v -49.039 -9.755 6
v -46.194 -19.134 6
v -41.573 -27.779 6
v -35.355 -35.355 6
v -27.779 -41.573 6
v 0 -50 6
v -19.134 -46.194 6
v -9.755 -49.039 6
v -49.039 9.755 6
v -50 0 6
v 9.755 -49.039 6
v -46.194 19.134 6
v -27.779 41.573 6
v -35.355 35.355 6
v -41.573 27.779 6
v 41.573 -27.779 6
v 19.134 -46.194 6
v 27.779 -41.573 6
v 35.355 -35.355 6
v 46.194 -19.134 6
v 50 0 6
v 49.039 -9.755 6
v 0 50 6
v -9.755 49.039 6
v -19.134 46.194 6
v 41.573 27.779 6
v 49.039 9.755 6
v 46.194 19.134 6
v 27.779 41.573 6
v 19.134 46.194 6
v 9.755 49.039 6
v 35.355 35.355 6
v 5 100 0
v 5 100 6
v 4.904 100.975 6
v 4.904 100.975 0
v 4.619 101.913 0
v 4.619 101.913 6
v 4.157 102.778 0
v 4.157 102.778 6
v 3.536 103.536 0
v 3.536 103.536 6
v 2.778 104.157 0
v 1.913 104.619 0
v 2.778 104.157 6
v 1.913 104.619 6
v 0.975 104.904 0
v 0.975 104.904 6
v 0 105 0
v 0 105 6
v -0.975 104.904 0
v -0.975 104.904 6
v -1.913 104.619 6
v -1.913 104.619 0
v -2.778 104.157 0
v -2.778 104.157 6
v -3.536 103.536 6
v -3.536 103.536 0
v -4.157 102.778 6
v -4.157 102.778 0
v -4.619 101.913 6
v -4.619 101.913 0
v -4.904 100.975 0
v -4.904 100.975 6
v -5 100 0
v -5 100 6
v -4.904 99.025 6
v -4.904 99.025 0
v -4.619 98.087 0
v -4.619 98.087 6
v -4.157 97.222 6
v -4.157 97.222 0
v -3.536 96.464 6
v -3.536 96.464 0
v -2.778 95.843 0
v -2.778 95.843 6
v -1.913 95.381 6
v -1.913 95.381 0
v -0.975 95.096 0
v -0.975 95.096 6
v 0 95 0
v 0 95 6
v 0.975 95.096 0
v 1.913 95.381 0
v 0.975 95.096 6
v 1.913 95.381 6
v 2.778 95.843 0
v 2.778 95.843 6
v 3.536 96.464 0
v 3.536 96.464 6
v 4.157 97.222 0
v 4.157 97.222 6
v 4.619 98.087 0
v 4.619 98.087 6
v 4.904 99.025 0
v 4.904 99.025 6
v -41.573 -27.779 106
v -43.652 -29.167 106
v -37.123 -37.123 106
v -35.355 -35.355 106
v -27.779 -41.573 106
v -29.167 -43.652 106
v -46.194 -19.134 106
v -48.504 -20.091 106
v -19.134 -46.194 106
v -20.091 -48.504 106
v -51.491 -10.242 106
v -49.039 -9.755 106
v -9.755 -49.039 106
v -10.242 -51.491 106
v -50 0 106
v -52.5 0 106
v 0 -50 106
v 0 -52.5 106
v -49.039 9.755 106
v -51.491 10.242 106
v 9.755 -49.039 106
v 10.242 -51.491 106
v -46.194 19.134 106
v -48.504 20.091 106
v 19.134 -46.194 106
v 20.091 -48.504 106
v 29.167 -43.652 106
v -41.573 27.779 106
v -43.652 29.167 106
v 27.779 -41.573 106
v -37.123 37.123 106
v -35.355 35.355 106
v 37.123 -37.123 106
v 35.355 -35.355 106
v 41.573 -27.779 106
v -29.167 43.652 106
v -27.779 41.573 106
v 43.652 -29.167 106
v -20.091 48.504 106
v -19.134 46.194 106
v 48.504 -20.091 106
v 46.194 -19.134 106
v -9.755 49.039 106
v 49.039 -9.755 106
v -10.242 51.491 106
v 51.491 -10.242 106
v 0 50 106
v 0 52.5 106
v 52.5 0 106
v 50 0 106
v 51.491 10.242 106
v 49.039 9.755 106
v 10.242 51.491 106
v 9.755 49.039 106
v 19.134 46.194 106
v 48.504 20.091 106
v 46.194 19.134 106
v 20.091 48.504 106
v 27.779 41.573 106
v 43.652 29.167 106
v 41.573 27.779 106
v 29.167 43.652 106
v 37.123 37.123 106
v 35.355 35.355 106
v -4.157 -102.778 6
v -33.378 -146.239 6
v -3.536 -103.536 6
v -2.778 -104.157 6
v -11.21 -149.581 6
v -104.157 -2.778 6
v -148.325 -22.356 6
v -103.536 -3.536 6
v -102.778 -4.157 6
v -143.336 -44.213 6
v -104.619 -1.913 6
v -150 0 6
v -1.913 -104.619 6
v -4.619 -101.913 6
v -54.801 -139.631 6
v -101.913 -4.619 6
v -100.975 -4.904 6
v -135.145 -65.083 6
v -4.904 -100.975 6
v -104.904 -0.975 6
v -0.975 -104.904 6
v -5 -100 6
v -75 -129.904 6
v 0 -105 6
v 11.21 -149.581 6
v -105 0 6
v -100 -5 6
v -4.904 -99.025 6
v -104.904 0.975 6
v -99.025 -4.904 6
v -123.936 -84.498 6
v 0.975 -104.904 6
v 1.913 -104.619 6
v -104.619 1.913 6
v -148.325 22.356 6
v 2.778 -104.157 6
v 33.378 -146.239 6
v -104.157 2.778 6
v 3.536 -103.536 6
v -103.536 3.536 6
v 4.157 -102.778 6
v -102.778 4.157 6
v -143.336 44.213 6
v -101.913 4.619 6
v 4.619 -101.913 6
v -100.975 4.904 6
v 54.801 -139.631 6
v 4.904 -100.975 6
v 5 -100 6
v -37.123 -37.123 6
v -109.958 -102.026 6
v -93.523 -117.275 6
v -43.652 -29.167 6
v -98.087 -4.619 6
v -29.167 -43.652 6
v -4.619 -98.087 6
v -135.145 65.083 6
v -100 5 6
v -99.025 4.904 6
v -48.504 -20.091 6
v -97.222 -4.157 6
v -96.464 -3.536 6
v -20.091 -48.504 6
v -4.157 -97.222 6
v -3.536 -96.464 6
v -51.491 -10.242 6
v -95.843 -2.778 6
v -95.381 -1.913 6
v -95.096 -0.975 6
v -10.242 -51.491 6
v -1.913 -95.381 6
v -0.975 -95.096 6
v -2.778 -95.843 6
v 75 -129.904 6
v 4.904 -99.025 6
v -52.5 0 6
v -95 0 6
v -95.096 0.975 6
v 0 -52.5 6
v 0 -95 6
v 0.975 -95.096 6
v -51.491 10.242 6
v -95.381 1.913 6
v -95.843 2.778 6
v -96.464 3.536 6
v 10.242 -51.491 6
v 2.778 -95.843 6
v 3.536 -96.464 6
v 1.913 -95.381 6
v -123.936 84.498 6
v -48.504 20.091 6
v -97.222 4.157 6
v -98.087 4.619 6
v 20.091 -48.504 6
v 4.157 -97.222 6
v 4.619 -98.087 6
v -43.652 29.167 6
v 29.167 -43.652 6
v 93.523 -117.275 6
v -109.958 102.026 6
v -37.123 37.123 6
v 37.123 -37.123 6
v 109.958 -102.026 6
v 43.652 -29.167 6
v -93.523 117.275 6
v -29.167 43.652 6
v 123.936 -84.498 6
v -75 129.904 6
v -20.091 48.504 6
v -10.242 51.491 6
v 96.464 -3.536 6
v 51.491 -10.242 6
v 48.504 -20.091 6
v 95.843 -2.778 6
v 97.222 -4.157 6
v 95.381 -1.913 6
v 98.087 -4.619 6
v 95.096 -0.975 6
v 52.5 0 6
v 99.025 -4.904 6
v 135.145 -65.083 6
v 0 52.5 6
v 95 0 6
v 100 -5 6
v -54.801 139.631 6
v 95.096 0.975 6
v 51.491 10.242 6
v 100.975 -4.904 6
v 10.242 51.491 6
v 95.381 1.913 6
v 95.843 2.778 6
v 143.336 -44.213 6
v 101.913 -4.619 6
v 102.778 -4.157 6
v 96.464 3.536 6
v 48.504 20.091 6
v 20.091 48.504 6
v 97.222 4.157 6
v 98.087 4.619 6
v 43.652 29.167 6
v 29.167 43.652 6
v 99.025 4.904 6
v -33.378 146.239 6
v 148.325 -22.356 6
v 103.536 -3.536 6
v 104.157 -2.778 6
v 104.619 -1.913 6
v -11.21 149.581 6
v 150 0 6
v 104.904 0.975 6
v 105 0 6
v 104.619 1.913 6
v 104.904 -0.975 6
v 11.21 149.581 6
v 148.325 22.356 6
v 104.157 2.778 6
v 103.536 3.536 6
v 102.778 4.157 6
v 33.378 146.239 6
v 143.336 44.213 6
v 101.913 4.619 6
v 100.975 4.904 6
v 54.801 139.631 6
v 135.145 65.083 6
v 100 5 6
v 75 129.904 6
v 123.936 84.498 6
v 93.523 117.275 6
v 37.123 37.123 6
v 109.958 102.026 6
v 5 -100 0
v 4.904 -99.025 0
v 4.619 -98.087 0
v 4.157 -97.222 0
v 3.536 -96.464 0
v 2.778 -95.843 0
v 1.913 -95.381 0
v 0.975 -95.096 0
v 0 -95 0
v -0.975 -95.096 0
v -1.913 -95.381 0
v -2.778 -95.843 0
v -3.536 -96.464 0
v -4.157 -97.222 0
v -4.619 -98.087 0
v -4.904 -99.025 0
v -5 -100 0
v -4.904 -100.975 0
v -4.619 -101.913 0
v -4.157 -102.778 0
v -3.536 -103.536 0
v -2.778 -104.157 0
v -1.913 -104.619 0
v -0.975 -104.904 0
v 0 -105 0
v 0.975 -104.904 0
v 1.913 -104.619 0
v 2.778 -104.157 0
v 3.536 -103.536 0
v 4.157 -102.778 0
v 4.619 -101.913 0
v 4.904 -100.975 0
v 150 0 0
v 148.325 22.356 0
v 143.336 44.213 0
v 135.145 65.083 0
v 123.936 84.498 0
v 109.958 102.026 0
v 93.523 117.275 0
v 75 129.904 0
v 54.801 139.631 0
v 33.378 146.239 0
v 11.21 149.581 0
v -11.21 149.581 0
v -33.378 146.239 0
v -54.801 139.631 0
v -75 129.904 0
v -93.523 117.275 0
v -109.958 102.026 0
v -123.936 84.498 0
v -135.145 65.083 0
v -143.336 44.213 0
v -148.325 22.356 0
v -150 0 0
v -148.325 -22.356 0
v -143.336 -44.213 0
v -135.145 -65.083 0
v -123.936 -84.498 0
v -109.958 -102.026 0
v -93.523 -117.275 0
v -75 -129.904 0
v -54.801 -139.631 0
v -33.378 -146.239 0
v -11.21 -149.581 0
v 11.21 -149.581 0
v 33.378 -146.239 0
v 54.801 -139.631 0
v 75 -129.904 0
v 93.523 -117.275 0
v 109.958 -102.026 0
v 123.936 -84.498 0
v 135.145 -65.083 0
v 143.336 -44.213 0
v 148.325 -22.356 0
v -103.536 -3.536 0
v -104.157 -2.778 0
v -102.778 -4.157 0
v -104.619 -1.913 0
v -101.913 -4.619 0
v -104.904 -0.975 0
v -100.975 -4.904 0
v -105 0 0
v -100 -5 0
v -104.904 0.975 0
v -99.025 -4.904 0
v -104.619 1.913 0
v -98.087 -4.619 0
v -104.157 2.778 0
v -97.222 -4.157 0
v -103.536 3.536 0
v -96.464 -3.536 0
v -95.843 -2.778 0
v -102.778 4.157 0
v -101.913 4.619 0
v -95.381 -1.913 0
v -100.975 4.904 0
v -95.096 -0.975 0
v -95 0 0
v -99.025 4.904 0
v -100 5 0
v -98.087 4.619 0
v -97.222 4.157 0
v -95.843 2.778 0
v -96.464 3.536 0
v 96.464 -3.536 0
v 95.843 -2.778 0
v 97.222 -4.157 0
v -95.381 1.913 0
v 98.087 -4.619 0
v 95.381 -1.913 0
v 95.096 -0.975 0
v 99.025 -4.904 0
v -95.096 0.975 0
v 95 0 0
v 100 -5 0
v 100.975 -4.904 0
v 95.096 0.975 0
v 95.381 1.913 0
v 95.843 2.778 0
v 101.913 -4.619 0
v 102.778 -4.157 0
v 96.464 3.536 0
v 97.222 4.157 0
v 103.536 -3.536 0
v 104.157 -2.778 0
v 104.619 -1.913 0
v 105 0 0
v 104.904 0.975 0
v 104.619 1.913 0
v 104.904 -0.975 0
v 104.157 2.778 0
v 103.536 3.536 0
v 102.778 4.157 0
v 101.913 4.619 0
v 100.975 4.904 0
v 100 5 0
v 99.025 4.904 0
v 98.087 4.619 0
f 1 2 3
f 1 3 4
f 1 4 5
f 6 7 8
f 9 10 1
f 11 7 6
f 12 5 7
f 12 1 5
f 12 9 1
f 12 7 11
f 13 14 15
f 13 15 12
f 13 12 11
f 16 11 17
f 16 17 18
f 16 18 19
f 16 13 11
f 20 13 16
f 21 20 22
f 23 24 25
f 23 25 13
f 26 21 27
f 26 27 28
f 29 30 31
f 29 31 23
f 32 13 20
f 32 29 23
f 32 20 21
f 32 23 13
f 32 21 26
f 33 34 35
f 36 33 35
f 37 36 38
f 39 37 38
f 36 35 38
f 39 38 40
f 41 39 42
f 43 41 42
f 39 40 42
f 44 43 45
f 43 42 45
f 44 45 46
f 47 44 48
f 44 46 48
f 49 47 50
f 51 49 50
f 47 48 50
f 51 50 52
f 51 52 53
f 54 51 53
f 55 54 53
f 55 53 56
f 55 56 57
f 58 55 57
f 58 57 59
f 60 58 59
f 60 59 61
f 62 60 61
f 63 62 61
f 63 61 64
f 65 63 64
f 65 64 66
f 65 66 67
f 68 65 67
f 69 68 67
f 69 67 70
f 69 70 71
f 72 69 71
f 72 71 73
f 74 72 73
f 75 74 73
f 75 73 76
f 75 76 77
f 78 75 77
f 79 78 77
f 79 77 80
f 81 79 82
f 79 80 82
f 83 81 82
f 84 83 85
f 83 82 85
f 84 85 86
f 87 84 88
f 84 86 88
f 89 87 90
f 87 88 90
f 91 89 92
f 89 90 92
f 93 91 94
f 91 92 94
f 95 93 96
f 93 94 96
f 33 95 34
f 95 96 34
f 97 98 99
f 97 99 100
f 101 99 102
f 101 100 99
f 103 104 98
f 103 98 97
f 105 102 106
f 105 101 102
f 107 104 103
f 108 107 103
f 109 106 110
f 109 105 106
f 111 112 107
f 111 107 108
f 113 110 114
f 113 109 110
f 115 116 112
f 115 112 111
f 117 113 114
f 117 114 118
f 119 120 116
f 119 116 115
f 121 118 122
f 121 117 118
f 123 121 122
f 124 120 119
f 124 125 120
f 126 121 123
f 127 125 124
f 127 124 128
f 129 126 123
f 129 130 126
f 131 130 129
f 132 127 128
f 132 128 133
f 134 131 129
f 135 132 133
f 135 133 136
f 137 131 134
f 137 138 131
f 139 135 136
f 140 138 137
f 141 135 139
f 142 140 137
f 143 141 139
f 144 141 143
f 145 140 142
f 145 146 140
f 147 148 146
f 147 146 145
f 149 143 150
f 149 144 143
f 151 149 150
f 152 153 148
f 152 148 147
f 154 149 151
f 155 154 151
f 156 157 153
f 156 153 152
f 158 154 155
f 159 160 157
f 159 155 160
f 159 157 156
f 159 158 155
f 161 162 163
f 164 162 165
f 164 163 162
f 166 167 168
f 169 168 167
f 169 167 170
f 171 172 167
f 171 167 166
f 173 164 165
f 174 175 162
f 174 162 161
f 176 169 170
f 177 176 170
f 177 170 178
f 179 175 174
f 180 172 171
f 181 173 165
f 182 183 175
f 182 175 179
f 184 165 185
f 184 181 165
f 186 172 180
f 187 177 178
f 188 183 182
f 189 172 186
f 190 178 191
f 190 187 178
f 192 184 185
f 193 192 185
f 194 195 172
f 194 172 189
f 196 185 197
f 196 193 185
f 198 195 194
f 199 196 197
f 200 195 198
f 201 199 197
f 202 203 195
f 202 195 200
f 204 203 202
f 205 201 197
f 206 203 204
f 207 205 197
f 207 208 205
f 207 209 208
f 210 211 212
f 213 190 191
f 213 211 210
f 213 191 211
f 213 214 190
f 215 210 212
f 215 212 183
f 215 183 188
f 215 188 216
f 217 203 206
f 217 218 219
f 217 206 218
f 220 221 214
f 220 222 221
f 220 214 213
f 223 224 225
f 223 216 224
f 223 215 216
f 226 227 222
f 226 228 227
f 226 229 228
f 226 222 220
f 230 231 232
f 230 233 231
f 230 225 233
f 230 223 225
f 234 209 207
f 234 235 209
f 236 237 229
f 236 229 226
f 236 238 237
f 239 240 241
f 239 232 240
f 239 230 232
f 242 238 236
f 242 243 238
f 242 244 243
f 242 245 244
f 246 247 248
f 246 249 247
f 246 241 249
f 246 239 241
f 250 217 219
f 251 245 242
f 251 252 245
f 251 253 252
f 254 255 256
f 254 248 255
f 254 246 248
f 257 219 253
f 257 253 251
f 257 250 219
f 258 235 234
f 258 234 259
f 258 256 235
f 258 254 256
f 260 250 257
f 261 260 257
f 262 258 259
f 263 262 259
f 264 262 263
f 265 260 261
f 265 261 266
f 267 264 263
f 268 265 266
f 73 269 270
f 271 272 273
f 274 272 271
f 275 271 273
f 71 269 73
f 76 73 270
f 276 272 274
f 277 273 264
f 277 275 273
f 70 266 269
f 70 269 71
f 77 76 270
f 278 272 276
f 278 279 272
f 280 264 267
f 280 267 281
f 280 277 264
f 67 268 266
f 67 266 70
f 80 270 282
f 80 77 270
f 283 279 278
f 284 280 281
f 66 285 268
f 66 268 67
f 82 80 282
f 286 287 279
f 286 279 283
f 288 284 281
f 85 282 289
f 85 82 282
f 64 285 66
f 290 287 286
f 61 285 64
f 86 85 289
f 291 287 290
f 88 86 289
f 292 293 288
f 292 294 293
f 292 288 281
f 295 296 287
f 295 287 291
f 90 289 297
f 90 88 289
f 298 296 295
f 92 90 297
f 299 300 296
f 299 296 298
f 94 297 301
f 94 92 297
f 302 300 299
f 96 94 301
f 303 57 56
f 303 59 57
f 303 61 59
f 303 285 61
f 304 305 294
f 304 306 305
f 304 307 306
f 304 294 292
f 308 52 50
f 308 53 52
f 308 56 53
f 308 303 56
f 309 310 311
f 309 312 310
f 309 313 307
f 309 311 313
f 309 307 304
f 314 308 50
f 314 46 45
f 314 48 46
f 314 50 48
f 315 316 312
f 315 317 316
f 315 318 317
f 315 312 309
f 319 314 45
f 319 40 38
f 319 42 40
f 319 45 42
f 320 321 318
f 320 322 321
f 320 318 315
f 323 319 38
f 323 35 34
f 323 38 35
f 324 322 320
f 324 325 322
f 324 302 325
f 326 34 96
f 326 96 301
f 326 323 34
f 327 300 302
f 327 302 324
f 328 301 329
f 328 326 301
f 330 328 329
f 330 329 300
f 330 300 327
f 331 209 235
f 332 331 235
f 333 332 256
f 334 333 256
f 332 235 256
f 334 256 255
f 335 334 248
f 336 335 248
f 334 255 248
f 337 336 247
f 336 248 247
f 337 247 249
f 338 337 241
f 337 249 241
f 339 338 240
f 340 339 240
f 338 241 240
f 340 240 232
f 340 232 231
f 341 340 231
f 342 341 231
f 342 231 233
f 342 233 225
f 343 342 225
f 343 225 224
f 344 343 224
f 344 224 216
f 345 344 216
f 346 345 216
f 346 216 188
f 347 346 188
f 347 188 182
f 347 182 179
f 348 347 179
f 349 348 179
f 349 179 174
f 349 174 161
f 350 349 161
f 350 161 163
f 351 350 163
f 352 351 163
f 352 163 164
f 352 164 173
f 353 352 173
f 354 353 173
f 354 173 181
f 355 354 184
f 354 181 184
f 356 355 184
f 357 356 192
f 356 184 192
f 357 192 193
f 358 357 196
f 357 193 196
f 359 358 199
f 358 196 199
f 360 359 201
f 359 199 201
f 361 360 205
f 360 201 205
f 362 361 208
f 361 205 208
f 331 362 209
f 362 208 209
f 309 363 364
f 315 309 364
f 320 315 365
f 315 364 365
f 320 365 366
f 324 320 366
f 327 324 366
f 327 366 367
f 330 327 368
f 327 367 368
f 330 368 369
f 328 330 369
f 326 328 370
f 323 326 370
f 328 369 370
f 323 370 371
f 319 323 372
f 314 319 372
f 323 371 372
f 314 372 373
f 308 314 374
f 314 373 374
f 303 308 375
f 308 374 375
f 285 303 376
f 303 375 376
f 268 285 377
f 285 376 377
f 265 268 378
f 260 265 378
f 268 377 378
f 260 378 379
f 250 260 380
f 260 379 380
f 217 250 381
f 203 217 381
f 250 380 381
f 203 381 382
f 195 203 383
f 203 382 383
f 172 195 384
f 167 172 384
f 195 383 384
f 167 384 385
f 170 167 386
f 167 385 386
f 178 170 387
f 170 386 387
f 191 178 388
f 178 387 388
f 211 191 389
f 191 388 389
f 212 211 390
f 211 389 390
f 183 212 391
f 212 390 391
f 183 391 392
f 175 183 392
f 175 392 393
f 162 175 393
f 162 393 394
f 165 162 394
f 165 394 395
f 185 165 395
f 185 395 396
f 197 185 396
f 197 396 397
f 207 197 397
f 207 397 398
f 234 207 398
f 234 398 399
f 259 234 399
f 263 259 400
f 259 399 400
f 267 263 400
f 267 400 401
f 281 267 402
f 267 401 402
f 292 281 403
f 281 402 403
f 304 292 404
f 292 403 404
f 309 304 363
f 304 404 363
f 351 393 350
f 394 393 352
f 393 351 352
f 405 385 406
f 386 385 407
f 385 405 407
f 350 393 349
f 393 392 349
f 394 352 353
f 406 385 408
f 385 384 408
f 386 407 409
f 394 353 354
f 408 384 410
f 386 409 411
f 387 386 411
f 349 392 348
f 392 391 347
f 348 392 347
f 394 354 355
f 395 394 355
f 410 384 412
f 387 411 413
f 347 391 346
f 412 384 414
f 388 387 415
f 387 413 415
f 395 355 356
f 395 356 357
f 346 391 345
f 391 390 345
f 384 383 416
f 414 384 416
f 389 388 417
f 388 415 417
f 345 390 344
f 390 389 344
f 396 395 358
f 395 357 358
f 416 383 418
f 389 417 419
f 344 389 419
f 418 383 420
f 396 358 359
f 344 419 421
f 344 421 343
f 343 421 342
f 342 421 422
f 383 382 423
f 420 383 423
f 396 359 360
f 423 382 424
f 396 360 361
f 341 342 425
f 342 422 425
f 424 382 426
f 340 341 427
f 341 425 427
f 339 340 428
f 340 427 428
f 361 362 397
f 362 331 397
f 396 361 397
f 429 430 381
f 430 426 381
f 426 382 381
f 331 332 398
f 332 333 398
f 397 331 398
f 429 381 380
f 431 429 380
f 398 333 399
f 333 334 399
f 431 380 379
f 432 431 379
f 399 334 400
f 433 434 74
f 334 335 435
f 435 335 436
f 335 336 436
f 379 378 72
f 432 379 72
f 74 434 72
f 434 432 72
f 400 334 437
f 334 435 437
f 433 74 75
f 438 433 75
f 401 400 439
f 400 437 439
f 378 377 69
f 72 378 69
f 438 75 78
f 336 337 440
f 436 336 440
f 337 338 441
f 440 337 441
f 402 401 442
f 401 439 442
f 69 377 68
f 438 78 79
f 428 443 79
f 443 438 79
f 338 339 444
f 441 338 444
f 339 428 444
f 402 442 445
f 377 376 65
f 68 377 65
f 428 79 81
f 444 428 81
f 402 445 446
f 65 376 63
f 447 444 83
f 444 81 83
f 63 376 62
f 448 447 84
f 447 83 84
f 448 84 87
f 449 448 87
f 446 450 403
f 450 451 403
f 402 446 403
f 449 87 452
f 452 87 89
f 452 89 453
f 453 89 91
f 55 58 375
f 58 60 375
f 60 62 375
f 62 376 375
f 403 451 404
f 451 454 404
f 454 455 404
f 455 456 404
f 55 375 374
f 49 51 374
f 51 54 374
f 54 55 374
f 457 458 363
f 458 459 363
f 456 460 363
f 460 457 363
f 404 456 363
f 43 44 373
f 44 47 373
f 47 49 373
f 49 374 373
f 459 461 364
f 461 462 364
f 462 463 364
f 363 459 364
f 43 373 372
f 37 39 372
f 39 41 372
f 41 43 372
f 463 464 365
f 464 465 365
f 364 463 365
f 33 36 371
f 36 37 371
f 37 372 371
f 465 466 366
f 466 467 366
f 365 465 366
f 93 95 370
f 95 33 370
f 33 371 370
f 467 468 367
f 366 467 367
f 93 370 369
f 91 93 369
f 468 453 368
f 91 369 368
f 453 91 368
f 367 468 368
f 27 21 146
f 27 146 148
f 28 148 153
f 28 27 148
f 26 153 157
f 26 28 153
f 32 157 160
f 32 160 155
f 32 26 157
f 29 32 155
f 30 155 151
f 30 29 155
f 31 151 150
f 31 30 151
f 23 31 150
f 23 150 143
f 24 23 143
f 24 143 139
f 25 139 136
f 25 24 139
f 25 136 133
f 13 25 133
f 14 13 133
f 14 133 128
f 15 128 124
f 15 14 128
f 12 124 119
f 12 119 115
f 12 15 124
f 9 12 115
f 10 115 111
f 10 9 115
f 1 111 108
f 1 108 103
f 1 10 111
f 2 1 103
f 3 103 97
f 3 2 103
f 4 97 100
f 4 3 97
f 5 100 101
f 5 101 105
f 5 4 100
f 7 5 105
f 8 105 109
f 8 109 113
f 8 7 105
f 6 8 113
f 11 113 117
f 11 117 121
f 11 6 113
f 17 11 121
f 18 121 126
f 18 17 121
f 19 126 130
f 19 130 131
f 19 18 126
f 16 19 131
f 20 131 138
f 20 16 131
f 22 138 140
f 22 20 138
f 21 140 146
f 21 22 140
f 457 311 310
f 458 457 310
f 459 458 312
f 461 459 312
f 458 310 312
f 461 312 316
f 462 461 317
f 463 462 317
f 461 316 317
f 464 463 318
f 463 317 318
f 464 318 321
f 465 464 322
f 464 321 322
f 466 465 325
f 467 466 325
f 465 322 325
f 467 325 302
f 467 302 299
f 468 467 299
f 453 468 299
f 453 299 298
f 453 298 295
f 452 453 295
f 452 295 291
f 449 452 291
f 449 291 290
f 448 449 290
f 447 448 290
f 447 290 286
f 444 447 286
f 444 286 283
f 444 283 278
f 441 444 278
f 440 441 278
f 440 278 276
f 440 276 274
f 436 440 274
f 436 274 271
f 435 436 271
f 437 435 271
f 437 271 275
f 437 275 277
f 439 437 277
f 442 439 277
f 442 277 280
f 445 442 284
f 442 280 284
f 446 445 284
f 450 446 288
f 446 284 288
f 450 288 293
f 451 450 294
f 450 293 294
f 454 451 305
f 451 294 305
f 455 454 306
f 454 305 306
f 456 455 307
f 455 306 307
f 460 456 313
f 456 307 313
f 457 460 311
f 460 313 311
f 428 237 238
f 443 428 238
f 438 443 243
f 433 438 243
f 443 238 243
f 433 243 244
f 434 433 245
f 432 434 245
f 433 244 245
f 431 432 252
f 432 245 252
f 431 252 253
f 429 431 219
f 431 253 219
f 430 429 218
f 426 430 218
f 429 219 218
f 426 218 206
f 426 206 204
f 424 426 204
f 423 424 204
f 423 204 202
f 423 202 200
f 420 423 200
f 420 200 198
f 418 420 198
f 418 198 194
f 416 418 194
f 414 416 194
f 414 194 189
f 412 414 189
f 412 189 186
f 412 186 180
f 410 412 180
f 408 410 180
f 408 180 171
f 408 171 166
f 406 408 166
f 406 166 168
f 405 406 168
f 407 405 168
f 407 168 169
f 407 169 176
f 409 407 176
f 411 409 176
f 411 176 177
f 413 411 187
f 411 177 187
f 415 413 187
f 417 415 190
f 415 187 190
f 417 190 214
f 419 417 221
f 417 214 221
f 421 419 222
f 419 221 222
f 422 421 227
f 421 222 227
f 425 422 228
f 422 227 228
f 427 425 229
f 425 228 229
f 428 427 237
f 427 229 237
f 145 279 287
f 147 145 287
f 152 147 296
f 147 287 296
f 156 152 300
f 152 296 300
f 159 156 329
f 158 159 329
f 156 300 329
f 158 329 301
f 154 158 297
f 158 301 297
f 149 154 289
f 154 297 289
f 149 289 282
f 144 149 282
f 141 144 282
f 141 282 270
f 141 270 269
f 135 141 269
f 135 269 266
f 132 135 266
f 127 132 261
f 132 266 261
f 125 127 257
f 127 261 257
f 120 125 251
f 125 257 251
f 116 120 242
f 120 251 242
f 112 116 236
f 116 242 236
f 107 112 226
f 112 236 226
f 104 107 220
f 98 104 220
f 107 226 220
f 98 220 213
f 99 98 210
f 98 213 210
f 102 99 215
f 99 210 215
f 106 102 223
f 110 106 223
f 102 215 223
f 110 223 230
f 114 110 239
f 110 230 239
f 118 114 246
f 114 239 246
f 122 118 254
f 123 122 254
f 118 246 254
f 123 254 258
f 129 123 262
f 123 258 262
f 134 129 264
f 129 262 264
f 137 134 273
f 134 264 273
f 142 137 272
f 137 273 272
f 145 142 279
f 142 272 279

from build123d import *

# Parameters (mm, degrees)
SKETCH2_R           = 150
BOSS_EXTRUDE1_DEPTH = 6
SKETCH3_R           = 52.5
SKETCH3_R_2         = 50
BOSS_EXTRUDE2_DEPTH = 100
SKETCH4_R           = 5
CUT_EXTRUDE1_DEPTH  = 100


with BuildPart() as part:
    # Sketch2 → Boss-Extrude1 (new body)
    with BuildSketch(Plane.XY):
        Circle(SKETCH2_R)
    extrude(amount=BOSS_EXTRUDE1_DEPTH)

    # Sketch3 → Boss-Extrude2 (add)
    with BuildSketch(Plane.XY.offset(6)):
        Circle(SKETCH3_R)
        Circle(SKETCH3_R_2, mode=Mode.SUBTRACT)
    extrude(amount=BOSS_EXTRUDE2_DEPTH)

    # Sketch4 → Cut-Extrude1 (cut)
    with BuildSketch(Plane.XY.offset(6)):
        with Locations((100, 0)):
            Circle(SKETCH4_R)
        with Locations((0, -100)):
            Circle(SKETCH4_R)
        with Locations((-100, 0)):
            Circle(SKETCH4_R)
        with Locations((0, 100)):
            Circle(SKETCH4_R)
    extrude(amount=-CUT_EXTRUDE1_DEPTH, mode=Mode.SUBTRACT)


solid = part.part
